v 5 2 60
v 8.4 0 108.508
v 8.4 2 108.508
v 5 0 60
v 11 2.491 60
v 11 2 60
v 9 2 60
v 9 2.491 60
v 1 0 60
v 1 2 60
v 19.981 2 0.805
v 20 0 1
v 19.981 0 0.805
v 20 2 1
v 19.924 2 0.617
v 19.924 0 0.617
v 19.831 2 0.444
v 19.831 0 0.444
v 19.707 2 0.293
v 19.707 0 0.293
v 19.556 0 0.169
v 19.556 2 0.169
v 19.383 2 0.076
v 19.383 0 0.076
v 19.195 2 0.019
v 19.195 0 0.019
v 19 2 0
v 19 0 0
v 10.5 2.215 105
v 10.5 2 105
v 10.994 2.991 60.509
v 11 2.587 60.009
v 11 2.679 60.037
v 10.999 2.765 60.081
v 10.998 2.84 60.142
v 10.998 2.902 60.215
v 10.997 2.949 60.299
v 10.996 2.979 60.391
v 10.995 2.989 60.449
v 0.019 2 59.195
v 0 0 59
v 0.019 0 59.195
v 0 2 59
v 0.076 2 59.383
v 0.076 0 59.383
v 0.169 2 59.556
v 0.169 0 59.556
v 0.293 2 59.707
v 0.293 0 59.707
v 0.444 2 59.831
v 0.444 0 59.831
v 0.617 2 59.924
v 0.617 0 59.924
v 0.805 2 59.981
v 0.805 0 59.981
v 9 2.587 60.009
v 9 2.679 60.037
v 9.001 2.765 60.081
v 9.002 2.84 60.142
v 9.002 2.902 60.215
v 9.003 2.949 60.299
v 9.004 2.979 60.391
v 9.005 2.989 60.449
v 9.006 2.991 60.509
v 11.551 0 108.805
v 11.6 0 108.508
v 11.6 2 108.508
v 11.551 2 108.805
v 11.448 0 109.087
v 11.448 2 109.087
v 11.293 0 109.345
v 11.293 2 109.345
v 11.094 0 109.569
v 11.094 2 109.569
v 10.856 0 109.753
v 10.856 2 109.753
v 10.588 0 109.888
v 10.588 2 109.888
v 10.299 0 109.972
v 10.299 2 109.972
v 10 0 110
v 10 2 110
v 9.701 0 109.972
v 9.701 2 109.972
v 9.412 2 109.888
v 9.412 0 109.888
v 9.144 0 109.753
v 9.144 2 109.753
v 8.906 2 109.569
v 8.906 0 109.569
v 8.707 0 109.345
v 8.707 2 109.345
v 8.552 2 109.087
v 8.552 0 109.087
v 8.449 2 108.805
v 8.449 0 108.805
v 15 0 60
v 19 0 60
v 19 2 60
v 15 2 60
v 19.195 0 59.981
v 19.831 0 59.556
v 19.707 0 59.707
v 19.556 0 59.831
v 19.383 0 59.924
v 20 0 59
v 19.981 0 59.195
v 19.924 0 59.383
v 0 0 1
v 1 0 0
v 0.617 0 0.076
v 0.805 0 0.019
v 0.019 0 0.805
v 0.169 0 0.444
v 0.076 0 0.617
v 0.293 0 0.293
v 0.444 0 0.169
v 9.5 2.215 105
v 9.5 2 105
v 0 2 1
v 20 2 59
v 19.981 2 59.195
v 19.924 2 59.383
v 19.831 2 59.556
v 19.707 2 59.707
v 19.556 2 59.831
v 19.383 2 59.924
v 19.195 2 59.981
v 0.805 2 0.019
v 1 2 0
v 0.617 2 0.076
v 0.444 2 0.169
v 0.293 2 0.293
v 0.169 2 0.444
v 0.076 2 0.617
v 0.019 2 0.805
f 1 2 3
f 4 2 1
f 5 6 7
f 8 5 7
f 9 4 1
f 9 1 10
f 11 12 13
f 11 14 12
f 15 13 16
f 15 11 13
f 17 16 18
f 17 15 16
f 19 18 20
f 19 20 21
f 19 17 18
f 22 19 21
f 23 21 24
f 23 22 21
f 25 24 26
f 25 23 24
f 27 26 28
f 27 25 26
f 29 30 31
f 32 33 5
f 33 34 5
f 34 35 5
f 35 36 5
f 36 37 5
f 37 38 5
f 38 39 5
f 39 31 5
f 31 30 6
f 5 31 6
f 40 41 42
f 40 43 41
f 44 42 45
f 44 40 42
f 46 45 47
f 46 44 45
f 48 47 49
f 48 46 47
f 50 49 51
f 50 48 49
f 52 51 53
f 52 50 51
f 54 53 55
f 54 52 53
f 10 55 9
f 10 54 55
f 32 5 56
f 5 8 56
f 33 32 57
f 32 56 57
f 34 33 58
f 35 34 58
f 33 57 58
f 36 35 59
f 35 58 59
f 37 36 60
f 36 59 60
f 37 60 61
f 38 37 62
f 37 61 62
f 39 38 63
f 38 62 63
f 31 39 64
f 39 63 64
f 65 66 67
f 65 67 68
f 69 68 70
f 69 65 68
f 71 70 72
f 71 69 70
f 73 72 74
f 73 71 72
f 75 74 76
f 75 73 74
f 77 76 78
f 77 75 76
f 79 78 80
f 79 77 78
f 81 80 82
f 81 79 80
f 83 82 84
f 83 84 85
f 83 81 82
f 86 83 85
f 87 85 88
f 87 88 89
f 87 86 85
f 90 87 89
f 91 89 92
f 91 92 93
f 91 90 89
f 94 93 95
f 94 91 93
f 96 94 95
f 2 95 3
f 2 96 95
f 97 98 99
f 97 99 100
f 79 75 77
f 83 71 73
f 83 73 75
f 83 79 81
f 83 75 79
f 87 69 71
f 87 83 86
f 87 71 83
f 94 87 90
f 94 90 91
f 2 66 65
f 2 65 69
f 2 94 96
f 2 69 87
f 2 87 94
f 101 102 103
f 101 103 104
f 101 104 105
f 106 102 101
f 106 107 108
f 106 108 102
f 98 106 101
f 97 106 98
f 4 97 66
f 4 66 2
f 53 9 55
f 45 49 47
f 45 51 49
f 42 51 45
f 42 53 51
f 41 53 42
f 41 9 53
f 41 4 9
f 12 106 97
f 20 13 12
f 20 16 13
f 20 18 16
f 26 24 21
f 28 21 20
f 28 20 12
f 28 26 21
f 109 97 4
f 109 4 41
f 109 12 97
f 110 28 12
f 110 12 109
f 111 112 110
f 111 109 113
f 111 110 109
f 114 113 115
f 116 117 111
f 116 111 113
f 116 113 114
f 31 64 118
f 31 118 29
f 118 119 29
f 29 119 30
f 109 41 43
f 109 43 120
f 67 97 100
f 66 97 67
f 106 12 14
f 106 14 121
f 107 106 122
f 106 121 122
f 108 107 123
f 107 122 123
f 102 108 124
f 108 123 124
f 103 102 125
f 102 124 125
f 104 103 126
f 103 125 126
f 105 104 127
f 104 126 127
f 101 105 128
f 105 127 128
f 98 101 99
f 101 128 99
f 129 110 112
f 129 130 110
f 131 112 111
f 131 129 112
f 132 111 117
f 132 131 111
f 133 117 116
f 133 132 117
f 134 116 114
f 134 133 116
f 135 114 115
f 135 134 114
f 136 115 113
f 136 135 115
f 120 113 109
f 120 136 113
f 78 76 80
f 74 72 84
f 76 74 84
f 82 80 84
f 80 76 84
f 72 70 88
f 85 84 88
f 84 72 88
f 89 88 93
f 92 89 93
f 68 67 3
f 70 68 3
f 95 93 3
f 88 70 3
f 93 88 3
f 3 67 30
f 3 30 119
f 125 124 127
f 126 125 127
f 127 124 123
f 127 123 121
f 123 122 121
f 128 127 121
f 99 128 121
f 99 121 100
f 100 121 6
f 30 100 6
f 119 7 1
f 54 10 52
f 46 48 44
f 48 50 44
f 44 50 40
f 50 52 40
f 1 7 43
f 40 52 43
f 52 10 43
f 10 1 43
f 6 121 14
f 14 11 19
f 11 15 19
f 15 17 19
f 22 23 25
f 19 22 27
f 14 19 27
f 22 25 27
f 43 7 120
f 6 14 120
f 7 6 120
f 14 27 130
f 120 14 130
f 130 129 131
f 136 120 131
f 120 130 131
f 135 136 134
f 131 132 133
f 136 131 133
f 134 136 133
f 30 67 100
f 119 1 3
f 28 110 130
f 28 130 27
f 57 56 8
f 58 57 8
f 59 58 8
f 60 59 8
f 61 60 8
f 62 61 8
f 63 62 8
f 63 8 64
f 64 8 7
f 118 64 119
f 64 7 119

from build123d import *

# Parameters (mm, degrees)
BOSS_EXTRUDE1_DEPTH = 2
FILLET2_R           = 1
FILLET3_R           = 1
FILLET4_R           = 1
FILLET5_R           = 1
BOSS_EXTRUDE2_DEPTH = 1
DRAFT1_ANGLE        = -1
FILLET7_R           = 0.5


with BuildPart() as part:
    # Sketch1 → Boss-Extrude1 (new body)
    with BuildSketch(Plane(origin=(0, 0, 0), x_dir=(1, 0, 0), z_dir=(0, 1, 0))):
        with BuildLine():
            Line((0, 0), (20, 0))
            Line((20, 0), (20, -60))
            Line((20, -60), (15, -60))
            Line((15, -60), (11.6, -108.508220533))
            ThreePointArc((11.6, -108.508220533), (10, -110), (8.4, -108.508220533))
            Line((8.4, -108.508220533), (5, -60))
            Line((5, -60), (0, -60))
            Line((0, -60), (0, 0))
        make_face()
    extrude(amount=BOSS_EXTRUDE1_DEPTH)

    # Fillet2
    fillet2_edges = [part.edges().sort_by_distance(p)[0] for p in [
        (0, 1, 0),
    ]]
    fillet(fillet2_edges, radius=FILLET2_R)

    # Fillet3
    fillet3_edges = [part.edges().sort_by_distance(p)[0] for p in [
        (20, 1, 60),
    ]]
    fillet(fillet3_edges, radius=FILLET3_R)

    # Fillet4
    fillet4_edges = [part.edges().sort_by_distance(p)[0] for p in [
        (20, 1, 0),
    ]]
    fillet(fillet4_edges, radius=FILLET4_R)

    # Fillet5
    fillet5_edges = [part.edges().sort_by_distance(p)[0] for p in [
        (0, 1, 60),
    ]]
    fillet(fillet5_edges, radius=FILLET5_R)

    # Sketch5 → Boss-Extrude2 (add)
    with BuildSketch(Plane(origin=(0, 2, 0), x_dir=(1, 0, 0), z_dir=(0, 1, 0))):
        Polygon((11, -60), (9, -60), (9.5, -105), (10.5, -105), align=None)
    extrude(amount=BOSS_EXTRUDE2_DEPTH)

    # Draft1
    draft1_faces = [part.faces().sort_by_distance(p)[0] for p in [
        (10, 3, 80),
    ]]
    draft(draft1_faces, Plane(origin=(11, 3, 60), x_dir=(-1, 0, 0), z_dir=(0, 0, -1)), DRAFT1_ANGLE)

    # Fillet7
    fillet7_edges = [part.edges().sort_by_distance(p)[0] for p in [
        (10, 3, 60),
    ]]
    fillet(fillet7_edges, radius=FILLET7_R)


solid = part.part
